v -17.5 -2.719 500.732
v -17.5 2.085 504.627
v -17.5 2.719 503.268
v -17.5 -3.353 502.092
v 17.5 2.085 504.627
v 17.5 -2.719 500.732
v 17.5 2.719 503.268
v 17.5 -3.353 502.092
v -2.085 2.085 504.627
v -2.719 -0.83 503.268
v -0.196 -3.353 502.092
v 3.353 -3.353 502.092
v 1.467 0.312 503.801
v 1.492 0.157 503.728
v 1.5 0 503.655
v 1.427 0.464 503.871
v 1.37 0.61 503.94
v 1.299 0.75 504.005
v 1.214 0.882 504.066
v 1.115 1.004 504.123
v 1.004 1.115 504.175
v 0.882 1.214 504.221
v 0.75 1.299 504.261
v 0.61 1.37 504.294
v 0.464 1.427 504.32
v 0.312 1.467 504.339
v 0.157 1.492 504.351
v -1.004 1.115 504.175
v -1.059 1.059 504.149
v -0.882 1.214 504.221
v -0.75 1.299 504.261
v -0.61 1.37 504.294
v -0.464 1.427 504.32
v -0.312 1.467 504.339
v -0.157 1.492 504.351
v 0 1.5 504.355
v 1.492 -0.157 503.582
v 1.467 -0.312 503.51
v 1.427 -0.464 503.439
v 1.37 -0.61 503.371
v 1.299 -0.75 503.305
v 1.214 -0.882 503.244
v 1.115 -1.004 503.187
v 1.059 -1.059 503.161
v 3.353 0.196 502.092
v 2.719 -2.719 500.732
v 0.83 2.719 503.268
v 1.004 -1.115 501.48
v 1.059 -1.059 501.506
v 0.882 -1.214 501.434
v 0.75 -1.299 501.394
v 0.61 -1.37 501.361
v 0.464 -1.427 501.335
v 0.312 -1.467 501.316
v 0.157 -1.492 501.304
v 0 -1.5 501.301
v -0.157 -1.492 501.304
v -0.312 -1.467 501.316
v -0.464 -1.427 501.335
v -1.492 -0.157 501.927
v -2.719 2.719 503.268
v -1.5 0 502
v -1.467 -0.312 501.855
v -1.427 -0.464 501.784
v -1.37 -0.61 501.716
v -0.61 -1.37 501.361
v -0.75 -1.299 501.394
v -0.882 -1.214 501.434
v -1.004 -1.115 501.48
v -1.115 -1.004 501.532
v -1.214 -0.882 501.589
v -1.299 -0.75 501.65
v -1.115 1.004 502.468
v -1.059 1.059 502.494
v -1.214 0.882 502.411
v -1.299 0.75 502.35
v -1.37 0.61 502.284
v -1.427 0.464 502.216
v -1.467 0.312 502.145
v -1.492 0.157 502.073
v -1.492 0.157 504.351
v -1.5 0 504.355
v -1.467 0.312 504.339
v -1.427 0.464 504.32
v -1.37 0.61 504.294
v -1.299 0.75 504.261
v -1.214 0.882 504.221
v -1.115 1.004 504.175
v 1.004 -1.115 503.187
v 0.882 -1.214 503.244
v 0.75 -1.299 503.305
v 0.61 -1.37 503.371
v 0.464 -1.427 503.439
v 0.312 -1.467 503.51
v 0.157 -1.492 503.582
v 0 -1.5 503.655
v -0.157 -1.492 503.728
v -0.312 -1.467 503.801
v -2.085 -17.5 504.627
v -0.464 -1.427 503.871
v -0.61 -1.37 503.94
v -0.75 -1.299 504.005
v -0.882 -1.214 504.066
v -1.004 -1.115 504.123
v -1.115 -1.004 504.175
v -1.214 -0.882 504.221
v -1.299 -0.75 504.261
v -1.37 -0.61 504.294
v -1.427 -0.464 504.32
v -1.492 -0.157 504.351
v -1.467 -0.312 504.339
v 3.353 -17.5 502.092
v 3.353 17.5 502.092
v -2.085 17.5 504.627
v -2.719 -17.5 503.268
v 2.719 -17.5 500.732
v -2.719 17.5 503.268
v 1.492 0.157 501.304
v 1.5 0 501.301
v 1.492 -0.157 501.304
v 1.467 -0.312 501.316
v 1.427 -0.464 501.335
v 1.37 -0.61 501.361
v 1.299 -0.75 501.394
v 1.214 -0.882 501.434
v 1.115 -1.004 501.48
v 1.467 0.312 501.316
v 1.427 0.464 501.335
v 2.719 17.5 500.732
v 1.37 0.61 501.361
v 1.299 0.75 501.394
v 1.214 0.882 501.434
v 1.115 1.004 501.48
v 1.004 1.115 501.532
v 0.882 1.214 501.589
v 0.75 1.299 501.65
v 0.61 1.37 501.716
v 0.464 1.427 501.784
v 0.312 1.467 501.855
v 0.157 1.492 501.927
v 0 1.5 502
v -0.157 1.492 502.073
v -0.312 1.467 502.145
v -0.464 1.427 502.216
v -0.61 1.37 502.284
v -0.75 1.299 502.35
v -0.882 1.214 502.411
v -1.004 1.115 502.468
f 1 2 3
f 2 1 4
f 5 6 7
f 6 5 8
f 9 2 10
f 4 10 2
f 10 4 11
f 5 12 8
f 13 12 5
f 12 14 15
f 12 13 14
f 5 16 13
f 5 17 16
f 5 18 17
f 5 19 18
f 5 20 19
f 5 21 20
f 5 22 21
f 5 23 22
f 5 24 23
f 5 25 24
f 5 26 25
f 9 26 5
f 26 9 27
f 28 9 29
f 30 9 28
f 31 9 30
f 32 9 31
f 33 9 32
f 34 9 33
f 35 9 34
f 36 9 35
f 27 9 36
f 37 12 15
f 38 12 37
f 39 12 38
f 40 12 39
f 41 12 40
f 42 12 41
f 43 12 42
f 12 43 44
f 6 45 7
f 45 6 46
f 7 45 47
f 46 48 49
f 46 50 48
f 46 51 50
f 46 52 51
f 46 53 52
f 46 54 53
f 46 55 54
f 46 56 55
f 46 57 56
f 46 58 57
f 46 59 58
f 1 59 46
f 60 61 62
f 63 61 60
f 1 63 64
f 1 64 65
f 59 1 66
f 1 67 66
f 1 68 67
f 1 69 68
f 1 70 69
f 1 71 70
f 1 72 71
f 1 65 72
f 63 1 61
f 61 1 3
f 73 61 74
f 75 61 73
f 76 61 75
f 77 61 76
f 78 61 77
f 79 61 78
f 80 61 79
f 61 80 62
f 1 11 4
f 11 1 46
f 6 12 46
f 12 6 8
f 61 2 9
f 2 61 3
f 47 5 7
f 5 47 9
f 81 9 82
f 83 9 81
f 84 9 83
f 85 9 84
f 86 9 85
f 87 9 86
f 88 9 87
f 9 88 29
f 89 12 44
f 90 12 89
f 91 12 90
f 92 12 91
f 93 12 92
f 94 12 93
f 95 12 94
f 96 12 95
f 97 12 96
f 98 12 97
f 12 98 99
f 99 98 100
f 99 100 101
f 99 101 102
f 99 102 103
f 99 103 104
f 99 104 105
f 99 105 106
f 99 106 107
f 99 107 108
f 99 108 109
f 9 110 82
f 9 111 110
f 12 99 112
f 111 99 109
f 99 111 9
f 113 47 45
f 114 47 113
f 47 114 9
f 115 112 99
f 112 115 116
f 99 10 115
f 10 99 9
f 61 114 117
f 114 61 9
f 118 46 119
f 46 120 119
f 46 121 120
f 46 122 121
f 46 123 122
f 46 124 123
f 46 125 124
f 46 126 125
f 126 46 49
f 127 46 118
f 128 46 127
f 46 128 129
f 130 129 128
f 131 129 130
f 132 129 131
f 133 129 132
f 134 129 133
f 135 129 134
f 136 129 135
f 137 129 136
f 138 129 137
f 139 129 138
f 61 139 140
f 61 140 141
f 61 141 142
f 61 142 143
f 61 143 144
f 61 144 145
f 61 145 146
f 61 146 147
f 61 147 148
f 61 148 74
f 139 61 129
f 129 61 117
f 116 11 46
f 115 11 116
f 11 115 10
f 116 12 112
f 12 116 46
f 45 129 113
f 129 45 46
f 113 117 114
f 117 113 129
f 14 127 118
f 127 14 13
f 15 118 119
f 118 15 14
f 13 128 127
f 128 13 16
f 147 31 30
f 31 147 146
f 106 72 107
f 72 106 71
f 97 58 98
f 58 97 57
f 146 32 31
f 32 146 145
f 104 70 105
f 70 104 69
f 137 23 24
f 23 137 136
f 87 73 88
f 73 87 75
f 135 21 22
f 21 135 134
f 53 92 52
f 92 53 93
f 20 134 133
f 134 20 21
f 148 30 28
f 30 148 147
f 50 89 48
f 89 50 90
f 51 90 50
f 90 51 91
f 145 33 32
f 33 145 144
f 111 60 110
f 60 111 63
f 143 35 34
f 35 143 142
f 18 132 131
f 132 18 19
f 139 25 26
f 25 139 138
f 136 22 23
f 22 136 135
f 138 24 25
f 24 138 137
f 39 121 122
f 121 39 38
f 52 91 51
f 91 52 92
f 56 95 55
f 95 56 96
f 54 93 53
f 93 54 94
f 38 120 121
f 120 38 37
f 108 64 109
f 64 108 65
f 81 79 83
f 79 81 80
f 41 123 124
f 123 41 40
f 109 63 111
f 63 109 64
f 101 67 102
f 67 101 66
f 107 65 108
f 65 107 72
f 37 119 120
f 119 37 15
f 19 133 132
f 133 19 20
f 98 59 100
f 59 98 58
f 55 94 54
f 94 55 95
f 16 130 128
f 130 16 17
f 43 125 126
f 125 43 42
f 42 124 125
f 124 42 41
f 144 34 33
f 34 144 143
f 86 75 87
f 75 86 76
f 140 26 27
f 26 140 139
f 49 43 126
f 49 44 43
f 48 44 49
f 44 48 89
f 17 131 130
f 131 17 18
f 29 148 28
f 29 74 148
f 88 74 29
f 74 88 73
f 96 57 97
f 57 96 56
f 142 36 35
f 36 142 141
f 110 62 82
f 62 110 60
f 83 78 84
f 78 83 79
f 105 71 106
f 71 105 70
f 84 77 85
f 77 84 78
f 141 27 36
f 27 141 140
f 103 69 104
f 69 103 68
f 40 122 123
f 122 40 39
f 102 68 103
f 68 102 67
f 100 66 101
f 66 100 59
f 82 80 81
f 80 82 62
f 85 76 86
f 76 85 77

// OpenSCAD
// Parámetros
cuchilla_largo = 35;
cuchilla_ancho = 6;
cuchilla_espesor = 1.5;
curvatura_angulo = 25;
centro_altura = 0.5;
orificio_diametro = 3;

module pala_inclinada() {
    rotate([curvatura_angulo, 0, 0])
        translate([-cuchilla_largo/2, -cuchilla_ancho/2, 0])
            cube([cuchilla_largo, cuchilla_ancho, cuchilla_espesor]);
}

module cuchilla_doble() {
    difference() {
        union() {
            // Pala 1
            pala_inclinada();

            // Pala 2 rotada 90°
            rotate([0, 0, 90])
                pala_inclinada();
        }

        // Orificio central
        translate([0, 0, -1])
            cylinder(h = cuchilla_espesor + 2, d = orificio_diametro, $fn=60);
    }
}

// Posicionar la cuchilla sobre el eje
translate([0, 0, 502])  // Alineado a tope de la varilla (500 + tope + pico)
    cuchilla_doble();
